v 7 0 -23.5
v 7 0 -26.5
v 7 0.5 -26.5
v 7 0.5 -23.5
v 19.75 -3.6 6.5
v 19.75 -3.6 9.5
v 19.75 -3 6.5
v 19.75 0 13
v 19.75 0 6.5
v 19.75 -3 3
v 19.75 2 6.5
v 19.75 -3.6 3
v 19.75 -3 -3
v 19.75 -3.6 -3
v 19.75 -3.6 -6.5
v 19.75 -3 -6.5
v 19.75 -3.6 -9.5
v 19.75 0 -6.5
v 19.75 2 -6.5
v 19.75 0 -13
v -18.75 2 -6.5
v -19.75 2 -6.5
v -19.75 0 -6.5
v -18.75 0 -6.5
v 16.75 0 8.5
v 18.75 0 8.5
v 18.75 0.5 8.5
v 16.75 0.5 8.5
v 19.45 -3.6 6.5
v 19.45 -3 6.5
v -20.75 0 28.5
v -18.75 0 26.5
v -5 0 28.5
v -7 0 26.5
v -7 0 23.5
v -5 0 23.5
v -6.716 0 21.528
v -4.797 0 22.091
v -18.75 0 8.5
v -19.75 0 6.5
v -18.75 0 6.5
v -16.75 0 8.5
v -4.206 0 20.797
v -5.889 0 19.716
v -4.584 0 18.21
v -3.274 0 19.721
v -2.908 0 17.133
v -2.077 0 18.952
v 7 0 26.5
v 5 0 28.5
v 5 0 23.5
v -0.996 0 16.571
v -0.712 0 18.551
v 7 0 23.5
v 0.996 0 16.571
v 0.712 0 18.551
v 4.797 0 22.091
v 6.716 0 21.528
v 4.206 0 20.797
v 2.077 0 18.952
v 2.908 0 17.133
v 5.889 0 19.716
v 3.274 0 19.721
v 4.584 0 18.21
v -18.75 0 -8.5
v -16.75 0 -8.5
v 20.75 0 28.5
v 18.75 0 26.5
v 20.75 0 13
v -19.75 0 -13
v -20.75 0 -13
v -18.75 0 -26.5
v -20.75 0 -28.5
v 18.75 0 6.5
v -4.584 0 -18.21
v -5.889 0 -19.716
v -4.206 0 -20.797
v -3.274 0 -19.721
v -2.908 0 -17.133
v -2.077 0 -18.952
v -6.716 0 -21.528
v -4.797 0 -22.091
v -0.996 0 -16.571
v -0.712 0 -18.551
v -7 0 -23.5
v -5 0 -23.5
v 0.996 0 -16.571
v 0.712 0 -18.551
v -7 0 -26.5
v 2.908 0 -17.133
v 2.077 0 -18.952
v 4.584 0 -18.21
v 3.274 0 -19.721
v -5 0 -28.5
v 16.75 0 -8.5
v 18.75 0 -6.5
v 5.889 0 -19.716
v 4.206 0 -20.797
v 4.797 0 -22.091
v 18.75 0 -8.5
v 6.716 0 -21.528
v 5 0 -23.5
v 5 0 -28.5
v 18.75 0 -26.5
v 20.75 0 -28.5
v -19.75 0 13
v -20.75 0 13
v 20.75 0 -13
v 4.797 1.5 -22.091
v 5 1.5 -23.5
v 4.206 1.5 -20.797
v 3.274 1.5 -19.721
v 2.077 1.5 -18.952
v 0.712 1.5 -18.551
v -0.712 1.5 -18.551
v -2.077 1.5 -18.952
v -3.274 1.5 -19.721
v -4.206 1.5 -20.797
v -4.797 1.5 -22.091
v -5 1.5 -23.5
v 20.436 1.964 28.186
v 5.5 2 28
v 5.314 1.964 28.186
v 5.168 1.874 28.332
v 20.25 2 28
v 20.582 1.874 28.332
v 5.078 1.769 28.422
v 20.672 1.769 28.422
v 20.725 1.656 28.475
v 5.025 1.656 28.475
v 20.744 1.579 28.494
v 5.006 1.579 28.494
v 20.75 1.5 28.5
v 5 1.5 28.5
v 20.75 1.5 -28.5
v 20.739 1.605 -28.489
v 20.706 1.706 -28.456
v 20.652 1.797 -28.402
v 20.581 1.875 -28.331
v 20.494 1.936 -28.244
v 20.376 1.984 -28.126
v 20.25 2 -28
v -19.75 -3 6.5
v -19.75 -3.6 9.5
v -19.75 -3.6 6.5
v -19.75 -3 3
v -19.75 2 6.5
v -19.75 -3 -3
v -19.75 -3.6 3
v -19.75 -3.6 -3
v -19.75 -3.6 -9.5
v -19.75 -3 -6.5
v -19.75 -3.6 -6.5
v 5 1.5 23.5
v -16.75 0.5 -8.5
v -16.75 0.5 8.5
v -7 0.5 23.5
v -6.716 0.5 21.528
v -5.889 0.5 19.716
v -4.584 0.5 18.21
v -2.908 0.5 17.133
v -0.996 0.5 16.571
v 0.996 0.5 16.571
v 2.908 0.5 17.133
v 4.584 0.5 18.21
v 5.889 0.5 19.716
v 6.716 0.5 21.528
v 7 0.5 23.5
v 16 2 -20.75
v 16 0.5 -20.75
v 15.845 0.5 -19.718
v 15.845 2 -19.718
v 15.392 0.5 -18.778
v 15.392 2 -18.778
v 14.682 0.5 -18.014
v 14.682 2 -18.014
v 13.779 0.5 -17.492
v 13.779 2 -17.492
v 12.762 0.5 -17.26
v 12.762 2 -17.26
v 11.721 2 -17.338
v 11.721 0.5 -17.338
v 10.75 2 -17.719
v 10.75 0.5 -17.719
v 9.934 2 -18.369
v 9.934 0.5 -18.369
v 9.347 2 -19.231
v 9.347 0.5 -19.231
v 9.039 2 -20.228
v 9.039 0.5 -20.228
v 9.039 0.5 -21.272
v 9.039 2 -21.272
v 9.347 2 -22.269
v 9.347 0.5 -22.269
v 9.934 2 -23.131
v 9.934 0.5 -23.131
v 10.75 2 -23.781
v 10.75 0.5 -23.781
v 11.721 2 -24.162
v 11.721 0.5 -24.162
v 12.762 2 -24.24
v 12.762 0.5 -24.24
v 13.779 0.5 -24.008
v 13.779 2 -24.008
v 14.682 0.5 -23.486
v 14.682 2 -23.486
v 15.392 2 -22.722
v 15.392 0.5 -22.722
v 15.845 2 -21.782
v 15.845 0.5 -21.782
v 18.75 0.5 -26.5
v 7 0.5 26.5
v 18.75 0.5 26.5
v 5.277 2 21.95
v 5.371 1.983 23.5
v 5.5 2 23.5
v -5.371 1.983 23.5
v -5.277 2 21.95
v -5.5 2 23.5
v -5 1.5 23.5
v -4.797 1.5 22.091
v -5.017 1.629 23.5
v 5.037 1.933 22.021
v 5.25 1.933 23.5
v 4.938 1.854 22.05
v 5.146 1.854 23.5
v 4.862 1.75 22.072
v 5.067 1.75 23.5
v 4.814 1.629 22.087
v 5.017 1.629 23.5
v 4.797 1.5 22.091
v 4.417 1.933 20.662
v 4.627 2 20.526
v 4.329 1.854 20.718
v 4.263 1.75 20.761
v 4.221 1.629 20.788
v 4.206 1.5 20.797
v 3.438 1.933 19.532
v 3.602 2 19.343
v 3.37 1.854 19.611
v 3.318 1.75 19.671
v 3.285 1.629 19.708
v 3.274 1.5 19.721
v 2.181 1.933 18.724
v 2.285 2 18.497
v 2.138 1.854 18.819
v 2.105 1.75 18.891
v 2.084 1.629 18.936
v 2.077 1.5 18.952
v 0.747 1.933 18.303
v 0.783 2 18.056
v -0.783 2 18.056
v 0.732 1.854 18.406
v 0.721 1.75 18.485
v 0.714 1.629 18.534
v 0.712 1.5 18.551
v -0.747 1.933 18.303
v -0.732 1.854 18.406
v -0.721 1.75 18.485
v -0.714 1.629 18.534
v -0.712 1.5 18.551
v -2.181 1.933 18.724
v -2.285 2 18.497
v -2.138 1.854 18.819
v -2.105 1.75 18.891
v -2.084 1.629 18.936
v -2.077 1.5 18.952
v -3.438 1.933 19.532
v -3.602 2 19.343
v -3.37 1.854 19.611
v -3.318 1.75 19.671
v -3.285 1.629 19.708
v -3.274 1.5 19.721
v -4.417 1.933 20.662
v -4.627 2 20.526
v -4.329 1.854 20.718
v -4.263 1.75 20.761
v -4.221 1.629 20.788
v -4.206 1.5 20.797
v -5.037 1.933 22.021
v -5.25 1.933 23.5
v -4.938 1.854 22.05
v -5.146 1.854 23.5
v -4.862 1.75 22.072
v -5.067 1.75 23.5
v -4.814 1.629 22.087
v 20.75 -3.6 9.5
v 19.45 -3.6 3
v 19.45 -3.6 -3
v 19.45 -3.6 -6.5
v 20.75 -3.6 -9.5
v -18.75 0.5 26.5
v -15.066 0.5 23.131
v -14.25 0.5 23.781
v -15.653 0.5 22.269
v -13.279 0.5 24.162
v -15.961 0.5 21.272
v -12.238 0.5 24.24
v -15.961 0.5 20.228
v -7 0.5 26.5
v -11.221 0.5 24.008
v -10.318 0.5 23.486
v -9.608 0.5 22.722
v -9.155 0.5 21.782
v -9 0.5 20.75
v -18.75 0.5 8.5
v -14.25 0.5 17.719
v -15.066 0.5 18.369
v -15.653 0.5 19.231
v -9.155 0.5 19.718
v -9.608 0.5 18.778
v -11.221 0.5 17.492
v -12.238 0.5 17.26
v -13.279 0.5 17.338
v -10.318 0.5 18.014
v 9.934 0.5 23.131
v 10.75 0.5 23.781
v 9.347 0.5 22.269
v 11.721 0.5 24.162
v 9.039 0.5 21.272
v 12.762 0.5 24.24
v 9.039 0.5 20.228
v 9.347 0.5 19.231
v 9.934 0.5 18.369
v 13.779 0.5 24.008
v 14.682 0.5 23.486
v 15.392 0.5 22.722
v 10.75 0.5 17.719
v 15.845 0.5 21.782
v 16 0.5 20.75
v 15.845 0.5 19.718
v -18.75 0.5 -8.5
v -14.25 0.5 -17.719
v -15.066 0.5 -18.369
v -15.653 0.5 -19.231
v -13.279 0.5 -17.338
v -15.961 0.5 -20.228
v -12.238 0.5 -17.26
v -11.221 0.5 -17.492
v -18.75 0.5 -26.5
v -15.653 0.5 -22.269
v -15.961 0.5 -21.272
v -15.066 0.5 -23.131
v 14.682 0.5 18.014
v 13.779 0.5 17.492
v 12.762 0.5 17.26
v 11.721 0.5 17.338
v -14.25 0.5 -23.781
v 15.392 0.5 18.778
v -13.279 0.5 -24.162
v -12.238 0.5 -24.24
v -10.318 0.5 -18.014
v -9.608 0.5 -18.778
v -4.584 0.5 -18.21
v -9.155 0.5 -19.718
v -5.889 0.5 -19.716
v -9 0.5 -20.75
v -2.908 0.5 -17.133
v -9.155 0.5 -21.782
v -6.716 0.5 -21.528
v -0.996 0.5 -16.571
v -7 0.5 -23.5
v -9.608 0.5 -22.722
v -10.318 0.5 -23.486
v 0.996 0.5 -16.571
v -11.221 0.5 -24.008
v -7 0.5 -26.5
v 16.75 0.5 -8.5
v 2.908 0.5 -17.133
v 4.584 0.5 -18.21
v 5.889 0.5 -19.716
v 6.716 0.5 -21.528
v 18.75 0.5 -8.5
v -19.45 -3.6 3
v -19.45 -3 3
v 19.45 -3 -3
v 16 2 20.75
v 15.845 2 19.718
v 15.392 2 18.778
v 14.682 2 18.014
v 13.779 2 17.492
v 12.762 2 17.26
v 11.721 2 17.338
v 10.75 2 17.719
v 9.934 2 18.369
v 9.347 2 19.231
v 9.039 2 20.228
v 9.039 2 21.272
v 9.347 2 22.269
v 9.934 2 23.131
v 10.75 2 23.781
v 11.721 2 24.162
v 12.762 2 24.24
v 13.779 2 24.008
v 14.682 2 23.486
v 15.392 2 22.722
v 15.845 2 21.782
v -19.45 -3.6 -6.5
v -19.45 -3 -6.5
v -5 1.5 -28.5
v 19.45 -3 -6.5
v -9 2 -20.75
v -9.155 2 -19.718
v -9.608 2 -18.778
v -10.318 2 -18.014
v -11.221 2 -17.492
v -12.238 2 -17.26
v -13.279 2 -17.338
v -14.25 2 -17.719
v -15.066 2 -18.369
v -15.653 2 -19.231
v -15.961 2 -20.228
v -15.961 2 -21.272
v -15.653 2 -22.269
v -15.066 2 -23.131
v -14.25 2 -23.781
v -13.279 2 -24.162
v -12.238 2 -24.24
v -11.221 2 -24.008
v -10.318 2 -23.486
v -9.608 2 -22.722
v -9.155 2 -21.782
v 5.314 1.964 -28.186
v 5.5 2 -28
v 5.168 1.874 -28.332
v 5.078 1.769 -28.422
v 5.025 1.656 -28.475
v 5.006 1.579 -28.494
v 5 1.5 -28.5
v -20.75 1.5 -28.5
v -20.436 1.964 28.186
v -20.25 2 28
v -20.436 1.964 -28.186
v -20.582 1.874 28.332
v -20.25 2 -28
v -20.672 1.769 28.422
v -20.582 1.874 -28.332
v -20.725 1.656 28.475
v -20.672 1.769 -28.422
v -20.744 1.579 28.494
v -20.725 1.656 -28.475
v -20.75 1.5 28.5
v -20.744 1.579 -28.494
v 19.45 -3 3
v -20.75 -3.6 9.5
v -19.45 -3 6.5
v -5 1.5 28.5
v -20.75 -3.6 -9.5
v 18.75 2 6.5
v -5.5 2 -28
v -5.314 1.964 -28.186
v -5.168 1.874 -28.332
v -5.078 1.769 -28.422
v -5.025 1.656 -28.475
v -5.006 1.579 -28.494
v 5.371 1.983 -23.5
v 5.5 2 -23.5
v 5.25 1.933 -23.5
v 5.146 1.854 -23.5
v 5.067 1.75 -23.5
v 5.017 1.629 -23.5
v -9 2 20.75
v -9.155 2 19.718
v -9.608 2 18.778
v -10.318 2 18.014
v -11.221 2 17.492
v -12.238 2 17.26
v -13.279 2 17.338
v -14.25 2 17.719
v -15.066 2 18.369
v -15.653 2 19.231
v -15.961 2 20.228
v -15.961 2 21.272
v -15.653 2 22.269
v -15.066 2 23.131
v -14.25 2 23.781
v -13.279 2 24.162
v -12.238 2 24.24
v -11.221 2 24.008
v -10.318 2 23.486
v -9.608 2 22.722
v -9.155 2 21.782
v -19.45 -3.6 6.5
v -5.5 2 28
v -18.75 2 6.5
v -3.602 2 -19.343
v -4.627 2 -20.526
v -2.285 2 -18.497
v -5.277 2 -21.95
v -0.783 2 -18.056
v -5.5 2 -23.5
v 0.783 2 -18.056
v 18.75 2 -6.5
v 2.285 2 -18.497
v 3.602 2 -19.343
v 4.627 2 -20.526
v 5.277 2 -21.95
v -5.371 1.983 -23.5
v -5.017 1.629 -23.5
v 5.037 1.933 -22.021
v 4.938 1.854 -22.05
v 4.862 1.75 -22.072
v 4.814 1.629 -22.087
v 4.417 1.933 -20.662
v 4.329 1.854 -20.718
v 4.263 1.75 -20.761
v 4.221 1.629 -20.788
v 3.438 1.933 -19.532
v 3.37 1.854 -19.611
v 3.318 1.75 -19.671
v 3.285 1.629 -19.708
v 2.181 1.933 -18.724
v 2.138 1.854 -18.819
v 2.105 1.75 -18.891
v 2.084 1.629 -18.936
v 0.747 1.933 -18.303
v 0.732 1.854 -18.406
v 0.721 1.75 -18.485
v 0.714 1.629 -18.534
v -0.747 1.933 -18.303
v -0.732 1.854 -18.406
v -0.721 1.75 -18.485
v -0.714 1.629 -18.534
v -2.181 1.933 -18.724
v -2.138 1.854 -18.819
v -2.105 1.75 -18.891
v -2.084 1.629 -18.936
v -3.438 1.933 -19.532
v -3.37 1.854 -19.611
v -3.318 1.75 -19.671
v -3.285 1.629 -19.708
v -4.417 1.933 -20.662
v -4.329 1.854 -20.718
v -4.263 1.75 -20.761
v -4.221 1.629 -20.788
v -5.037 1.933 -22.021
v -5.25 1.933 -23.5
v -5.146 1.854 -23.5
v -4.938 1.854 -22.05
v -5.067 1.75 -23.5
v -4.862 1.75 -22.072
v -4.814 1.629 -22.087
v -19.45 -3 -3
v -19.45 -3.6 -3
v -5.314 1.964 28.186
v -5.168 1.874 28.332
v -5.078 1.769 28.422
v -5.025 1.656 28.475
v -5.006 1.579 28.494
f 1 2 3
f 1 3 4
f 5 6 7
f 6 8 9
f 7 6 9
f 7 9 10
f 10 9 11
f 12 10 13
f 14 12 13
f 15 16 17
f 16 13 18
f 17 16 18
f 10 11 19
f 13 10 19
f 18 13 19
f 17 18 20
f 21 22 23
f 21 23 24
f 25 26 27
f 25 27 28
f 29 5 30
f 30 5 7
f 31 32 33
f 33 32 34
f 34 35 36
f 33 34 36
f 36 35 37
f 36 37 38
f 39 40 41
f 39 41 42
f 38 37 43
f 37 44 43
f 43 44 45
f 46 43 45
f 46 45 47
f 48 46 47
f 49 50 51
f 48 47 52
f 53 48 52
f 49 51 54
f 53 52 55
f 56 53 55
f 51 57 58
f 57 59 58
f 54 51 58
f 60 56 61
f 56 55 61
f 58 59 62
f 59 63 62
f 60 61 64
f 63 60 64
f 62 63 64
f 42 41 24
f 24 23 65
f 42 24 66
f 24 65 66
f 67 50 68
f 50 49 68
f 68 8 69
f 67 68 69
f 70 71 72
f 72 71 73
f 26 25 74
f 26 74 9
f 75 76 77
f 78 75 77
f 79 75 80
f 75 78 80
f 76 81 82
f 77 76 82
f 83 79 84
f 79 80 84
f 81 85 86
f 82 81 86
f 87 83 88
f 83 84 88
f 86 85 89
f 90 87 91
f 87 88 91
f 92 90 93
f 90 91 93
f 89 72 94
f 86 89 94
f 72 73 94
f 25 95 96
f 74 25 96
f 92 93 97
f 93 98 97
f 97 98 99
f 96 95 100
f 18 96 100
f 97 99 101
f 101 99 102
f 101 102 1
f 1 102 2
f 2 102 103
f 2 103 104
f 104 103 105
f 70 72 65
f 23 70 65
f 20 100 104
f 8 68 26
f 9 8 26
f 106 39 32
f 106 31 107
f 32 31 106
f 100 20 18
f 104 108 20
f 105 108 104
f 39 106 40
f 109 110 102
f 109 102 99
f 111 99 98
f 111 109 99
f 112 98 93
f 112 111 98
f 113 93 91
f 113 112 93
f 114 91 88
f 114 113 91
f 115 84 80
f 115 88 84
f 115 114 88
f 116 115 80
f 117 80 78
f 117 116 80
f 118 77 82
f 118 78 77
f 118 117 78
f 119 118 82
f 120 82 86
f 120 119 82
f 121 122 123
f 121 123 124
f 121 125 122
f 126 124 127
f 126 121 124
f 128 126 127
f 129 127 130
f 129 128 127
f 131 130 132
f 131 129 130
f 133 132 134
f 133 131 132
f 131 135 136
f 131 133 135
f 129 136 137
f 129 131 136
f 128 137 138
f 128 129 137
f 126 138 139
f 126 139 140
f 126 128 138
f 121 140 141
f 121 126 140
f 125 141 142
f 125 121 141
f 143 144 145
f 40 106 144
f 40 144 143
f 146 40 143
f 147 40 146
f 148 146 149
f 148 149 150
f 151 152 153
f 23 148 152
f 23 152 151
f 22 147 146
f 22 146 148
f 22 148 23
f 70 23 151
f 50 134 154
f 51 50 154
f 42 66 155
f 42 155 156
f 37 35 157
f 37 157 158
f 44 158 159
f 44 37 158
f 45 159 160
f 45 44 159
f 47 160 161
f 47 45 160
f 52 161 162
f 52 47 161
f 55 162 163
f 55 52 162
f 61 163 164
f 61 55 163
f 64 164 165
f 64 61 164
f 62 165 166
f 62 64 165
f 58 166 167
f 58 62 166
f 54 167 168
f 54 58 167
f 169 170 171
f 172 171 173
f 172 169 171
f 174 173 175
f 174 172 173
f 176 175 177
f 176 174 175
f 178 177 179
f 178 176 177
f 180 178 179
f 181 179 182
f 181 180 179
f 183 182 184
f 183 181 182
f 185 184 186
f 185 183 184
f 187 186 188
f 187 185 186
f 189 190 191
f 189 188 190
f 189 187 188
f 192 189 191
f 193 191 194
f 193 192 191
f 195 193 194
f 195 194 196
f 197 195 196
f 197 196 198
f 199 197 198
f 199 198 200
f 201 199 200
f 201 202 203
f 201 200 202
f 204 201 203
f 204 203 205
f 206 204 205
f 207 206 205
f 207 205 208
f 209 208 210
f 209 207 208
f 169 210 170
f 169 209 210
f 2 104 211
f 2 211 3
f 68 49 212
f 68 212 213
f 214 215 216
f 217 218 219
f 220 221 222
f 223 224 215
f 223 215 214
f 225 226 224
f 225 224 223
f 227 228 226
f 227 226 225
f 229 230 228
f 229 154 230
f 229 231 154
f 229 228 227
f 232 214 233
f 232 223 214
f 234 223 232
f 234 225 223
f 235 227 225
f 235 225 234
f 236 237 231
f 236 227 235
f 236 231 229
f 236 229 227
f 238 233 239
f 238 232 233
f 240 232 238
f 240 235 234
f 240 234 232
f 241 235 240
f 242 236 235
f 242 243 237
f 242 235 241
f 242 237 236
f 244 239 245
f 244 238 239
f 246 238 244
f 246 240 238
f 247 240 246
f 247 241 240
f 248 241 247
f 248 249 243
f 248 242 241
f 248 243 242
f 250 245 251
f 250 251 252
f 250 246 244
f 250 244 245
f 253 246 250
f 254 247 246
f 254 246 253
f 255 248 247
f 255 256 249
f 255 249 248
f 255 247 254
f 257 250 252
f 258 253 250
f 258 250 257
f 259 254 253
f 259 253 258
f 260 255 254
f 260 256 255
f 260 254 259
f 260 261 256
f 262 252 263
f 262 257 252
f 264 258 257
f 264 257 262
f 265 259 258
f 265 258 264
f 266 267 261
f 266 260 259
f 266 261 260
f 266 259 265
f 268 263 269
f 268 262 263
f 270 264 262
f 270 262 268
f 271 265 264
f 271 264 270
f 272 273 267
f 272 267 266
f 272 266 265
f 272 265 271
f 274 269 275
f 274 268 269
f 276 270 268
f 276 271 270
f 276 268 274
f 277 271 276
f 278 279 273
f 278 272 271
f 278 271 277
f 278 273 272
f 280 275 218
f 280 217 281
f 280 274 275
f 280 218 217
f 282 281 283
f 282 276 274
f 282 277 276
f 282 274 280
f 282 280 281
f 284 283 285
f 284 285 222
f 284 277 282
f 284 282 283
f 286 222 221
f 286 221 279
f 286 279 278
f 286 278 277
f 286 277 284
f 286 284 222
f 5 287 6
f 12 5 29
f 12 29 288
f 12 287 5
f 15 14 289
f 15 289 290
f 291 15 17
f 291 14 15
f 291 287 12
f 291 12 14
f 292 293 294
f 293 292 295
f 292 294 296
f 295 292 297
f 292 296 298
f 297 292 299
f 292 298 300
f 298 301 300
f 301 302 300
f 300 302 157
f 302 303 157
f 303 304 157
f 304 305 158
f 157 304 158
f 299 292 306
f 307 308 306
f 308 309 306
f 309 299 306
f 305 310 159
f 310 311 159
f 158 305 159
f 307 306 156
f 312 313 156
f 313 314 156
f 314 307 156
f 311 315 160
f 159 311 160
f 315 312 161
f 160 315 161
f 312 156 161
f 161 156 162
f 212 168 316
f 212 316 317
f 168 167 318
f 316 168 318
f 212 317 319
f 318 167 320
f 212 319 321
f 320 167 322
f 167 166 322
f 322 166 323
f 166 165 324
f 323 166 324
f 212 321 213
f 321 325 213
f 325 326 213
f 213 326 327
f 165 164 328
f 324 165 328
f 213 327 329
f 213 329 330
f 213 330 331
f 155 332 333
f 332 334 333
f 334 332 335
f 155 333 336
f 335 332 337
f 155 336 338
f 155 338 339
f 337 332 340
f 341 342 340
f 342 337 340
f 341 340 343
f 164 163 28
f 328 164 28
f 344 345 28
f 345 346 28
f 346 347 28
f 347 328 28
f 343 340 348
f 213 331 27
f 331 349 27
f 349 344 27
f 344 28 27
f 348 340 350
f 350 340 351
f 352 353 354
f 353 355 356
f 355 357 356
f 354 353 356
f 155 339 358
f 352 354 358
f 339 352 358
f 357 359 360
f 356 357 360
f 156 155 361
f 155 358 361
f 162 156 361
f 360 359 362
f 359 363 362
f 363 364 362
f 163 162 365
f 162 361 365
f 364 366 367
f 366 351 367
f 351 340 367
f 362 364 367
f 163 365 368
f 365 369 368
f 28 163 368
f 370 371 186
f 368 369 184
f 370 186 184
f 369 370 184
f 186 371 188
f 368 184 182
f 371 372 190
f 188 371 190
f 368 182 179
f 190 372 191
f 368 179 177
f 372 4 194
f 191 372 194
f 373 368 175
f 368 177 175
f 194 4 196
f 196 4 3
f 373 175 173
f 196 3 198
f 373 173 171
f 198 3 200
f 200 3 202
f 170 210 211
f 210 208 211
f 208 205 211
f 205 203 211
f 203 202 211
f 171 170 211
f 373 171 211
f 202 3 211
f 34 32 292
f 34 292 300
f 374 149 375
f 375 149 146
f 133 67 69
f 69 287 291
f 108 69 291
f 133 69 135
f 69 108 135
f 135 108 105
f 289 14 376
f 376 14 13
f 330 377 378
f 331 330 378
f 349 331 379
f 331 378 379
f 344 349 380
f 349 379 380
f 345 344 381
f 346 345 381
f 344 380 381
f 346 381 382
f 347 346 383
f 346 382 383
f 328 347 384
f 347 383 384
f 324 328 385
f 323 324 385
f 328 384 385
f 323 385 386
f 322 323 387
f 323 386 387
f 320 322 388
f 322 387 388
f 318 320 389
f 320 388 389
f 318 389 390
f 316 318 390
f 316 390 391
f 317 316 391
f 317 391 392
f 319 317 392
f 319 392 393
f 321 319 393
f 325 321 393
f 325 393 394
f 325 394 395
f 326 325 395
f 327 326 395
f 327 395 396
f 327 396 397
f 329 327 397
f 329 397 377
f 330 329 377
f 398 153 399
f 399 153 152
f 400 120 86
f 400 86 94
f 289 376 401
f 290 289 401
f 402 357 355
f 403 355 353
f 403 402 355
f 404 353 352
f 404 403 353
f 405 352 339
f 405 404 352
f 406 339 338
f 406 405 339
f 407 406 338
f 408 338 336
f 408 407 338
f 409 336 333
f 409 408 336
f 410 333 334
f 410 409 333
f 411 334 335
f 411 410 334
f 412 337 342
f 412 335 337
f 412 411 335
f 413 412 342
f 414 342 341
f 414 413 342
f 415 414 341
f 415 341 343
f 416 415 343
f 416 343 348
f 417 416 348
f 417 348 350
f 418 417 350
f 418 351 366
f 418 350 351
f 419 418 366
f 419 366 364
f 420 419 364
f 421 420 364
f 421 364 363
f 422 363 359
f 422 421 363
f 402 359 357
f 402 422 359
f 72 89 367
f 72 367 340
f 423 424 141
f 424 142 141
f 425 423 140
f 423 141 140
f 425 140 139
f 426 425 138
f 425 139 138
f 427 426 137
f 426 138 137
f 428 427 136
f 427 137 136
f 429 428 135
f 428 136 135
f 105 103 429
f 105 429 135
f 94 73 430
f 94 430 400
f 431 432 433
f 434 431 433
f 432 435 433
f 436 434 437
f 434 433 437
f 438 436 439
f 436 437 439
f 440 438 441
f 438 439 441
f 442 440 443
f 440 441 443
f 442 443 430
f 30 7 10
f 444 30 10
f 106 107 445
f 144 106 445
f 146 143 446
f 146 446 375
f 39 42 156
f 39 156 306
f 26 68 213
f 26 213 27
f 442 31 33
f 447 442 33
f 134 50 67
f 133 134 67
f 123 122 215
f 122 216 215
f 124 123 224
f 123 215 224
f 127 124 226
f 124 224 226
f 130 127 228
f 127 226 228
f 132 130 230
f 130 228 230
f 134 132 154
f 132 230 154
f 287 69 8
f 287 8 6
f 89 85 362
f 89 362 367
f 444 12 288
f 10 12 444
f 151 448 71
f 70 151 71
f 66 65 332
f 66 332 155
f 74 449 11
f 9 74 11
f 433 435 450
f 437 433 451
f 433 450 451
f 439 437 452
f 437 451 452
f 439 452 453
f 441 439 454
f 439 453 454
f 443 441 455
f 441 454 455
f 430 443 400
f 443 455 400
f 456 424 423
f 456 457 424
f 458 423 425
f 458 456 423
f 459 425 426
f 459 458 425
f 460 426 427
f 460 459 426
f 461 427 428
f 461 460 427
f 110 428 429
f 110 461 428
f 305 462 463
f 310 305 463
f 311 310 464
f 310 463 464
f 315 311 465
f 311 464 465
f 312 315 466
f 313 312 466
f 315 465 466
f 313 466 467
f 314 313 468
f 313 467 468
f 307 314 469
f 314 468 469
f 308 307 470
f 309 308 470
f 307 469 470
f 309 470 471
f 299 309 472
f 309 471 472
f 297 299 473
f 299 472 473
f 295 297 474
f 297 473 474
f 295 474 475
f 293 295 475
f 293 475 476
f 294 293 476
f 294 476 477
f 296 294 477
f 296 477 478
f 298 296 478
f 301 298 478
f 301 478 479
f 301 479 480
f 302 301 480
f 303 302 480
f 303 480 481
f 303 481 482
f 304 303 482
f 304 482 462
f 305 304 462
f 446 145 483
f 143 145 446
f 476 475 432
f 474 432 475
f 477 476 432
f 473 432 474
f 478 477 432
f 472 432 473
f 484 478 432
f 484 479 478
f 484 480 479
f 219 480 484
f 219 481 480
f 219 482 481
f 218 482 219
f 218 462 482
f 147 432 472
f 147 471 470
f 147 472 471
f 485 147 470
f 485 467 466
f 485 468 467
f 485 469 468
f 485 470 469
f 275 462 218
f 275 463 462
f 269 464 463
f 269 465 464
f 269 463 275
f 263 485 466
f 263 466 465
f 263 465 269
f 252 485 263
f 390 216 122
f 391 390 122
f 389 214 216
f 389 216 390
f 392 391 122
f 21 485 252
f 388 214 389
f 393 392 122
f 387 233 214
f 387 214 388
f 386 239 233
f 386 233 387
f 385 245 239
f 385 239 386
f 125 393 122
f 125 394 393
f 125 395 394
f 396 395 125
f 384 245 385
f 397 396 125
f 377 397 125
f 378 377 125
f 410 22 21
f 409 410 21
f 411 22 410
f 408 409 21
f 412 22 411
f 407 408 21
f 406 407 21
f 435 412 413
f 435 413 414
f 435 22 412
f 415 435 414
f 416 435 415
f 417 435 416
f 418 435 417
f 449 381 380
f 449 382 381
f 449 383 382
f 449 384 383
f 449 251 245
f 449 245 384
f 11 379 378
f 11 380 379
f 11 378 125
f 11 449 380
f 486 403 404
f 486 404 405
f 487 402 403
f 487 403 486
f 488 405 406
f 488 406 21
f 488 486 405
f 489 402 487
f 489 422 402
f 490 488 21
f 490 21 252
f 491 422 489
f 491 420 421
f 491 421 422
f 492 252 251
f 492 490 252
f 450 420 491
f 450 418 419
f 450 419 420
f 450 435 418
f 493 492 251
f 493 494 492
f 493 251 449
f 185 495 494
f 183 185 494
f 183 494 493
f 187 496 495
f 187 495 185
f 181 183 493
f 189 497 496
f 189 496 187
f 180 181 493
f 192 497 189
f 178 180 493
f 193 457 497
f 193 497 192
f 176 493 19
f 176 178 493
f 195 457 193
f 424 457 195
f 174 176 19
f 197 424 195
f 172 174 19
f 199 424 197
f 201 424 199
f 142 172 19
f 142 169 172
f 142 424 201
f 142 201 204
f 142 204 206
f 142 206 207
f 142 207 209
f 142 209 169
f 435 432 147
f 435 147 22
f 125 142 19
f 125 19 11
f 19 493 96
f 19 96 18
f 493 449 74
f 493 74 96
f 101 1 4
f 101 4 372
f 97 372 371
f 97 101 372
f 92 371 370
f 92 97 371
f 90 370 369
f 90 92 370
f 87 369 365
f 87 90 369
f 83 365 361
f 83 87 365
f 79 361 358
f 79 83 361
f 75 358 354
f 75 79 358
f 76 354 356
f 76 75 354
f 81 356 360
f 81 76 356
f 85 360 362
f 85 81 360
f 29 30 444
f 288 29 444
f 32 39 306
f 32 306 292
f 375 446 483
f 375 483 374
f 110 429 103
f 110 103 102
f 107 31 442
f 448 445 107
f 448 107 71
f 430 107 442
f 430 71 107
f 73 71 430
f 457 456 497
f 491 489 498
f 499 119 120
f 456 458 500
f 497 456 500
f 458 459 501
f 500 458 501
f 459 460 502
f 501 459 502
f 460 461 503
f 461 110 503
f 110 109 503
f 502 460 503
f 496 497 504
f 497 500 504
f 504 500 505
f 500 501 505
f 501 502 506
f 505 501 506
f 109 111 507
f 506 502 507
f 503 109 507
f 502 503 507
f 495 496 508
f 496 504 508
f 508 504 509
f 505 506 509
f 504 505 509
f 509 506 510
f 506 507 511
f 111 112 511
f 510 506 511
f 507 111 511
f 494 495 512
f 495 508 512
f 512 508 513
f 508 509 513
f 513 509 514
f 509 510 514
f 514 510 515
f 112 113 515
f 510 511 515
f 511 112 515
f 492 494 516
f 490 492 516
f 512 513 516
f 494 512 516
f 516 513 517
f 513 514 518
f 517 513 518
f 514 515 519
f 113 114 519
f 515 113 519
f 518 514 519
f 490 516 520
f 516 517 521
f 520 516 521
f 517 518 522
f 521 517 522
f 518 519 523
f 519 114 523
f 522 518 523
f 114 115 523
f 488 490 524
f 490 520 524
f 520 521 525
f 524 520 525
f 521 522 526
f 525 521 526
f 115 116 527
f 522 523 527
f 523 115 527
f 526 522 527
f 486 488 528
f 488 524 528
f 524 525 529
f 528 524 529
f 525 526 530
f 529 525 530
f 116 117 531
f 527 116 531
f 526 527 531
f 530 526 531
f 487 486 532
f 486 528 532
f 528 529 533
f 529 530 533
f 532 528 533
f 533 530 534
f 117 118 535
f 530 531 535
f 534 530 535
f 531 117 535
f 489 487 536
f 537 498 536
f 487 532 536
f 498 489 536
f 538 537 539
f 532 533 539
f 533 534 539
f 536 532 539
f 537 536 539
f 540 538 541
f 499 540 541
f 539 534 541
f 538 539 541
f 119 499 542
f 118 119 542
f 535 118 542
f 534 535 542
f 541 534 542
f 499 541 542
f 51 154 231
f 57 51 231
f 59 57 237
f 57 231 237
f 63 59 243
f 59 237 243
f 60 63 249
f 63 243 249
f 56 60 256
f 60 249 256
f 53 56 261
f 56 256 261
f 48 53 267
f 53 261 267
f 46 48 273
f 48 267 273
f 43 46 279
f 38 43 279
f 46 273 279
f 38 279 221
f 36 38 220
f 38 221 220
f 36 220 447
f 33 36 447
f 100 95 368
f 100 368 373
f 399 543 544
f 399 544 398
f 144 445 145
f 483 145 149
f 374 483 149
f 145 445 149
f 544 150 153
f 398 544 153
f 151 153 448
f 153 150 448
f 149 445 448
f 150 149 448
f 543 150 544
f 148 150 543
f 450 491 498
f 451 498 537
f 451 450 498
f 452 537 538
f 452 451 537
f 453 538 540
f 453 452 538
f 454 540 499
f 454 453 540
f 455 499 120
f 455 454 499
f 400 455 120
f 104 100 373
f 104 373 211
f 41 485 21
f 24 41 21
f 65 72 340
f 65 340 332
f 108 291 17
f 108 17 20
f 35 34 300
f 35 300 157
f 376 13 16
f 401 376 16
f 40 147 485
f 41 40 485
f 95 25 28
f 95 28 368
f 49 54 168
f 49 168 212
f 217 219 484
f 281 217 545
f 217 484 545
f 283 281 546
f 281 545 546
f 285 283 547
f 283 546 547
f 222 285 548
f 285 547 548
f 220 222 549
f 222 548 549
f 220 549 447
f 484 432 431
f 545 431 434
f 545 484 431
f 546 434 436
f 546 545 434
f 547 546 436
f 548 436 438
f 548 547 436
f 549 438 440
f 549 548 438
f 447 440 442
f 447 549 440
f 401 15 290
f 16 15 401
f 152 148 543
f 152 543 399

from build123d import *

# Parameters (mm, degrees)
SKETCH1_W           = 41.5
SKETCH1_H           = 57
BOSS_EXTRUDE1_DEPTH = 2
CUT_EXTRUDE1_DEPTH  = 3
SKETCH3_R           = 3.5
CUT_EXTRUDE2_DEPTH  = 3
SKETCH4_W           = 2
SKETCH4_H           = 13
CUT_EXTRUDE3_DEPTH  = 3
CUT_EXTRUDE4_DEPTH  = 0.5
BOSS_EXTRUDE2_DEPTH = 1
SKETCH7_W           = 3.5
SKETCH7_H           = 0.6
BOSS_EXTRUDE3_DEPTH = 0.3
FILLET1_R           = 0.5


with BuildPart() as part:
    # Sketch1 → Boss-Extrude1 (new body)
    with BuildSketch(Plane(origin=(0, 0, 0), x_dir=(1, 0, 0), z_dir=(0, 1, 0))):
        Rectangle(SKETCH1_W, SKETCH1_H)
    extrude(amount=BOSS_EXTRUDE1_DEPTH)

    # Sketch2 → Cut-Extrude1 (cut, through all)
    with BuildSketch(Plane(origin=(0, 2, 0), x_dir=(1, 0, 0), z_dir=(0, 1, 0))):
        with BuildLine():
            Line((-5, -23.5), (-5, -28.5))
            Line((-5, -28.5), (5, -28.5))
            Line((5, -28.5), (5, -23.5))
            ThreePointArc((5, -23.5), (0, -18.5), (-5, -23.5))
        make_face()
    cut_extrude1 = extrude(amount=-CUT_EXTRUDE1_DEPTH, mode=Mode.SUBTRACT)

    # Sketch3 → Cut-Extrude2 (cut, through all)
    with BuildSketch(Plane(origin=(0, 2, 0), x_dir=(1, 0, 0), z_dir=(0, 1, 0))):
        with Locations((-12.5, -20.75)):
            Circle(SKETCH3_R)
        with Locations((12.5, -20.75)):
            Circle(SKETCH3_R)
    cut_extrude2 = extrude(amount=-CUT_EXTRUDE2_DEPTH, mode=Mode.SUBTRACT)

    # Mirror1: Cut-Extrude1, Cut-Extrude2 across plane
    add(cut_extrude1.mirror(Plane.XY), mode=Mode.SUBTRACT)
    add(cut_extrude2.mirror(Plane.XY), mode=Mode.SUBTRACT)

    # Sketch4 → Cut-Extrude3 (cut, through all)
    with BuildSketch(Plane(origin=(0, 2, 0), x_dir=(1, 0, 0), z_dir=(0, 1, 0))):
        with Locations((-19.75, 0)):
            Rectangle(SKETCH4_W, SKETCH4_H)
        with Locations((19.75, 0)):
            Rectangle(SKETCH4_W, SKETCH4_H)
    extrude(amount=-CUT_EXTRUDE3_DEPTH, mode=Mode.SUBTRACT)

    # Sketch5 → Cut-Extrude4 (cut)
    with BuildSketch(Plane(origin=(0, 0, 0), x_dir=(1, 0, 0), z_dir=(0, 1, 0))):
        with BuildLine():
            Line((-18.75, 26.5), (-18.75, 8.5))
            Line((-18.75, 8.5), (-16.75, 8.5))
            Line((-16.75, 8.5), (-16.75, -8.5))
            Line((-16.75, -8.5), (-18.75, -8.5))
            Line((-18.75, -8.5), (-18.75, -26.5))
            Line((-18.75, -26.5), (-7, -26.5))
            Line((-7, -26.5), (-7, -23.5))
            ThreePointArc((-7, -23.5), (0, -16.5), (7, -23.5))
            Line((7, -23.5), (7, -26.5))
            Line((7, -26.5), (18.75, -26.5))
            Line((18.75, -26.5), (18.75, -8.5))
            Line((18.75, -8.5), (16.75, -8.5))
            Line((16.75, -8.5), (16.75, 8.5))
            Line((16.75, 8.5), (18.75, 8.5))
            Line((18.75, 8.5), (18.75, 26.5))
            Line((18.75, 26.5), (7, 26.5))
            Line((7, 26.5), (7, 23.5))
            ThreePointArc((7, 23.5), (0, 16.5), (-7, 23.5))
            Line((-7, 23.5), (-7, 26.5))
            Line((-7, 26.5), (-18.75, 26.5))
        make_face()
    extrude(amount=CUT_EXTRUDE4_DEPTH, mode=Mode.SUBTRACT)

    # Sketch6 → Boss-Extrude2 (add)
    with BuildSketch(Plane.ZY.offset(20.75)):
        Polygon((-13, 2), (13, 2), (13, 0), (9.5, -3.6), (-9.5, -3.6), (-13, 0), align=None)
    boss_extrude2 = extrude(amount=-BOSS_EXTRUDE2_DEPTH)

    # Sketch7 → Boss-Extrude3 (add)
    with BuildSketch(Plane(origin=(-19.75, 0, 0), x_dir=(0, 0, -1), z_dir=(1, 0, 0))):
        with Locations((-4.75, -3.3)):
            Rectangle(SKETCH7_W, SKETCH7_H)
        with Locations((4.75, -3.3)):
            Rectangle(SKETCH7_W, SKETCH7_H)
    boss_extrude3 = extrude(amount=BOSS_EXTRUDE3_DEPTH)

    # Mirror2: Boss-Extrude2, Boss-Extrude3 across plane
    add(boss_extrude2.mirror(Plane(origin=(0, 0, 0), x_dir=(0, 0, 1), z_dir=(1, 0, 0))))
    add(boss_extrude3.mirror(Plane(origin=(0, 0, 0), x_dir=(0, 0, 1), z_dir=(1, 0, 0))))

    # Fillet1
    fillet1_edges = [part.edges().sort_by_distance(p)[0] for p in [
        (-20.75, 2, 0),
        (-12.875, 2, 28.5),
        (12.875, 2, 28.5),
        (5, 2, 26),
        (0, 2, 18.5),
        (-5, 2, 26),
        (20.75, 2, 0),
        (-12.875, 2, -28.5),
        (5, 2, -26),
        (0, 2, -18.5),
        (-5, 2, -26),
        (12.875, 2, -28.5),
    ]]
    fillet(fillet1_edges, radius=FILLET1_R)


solid = part.part
